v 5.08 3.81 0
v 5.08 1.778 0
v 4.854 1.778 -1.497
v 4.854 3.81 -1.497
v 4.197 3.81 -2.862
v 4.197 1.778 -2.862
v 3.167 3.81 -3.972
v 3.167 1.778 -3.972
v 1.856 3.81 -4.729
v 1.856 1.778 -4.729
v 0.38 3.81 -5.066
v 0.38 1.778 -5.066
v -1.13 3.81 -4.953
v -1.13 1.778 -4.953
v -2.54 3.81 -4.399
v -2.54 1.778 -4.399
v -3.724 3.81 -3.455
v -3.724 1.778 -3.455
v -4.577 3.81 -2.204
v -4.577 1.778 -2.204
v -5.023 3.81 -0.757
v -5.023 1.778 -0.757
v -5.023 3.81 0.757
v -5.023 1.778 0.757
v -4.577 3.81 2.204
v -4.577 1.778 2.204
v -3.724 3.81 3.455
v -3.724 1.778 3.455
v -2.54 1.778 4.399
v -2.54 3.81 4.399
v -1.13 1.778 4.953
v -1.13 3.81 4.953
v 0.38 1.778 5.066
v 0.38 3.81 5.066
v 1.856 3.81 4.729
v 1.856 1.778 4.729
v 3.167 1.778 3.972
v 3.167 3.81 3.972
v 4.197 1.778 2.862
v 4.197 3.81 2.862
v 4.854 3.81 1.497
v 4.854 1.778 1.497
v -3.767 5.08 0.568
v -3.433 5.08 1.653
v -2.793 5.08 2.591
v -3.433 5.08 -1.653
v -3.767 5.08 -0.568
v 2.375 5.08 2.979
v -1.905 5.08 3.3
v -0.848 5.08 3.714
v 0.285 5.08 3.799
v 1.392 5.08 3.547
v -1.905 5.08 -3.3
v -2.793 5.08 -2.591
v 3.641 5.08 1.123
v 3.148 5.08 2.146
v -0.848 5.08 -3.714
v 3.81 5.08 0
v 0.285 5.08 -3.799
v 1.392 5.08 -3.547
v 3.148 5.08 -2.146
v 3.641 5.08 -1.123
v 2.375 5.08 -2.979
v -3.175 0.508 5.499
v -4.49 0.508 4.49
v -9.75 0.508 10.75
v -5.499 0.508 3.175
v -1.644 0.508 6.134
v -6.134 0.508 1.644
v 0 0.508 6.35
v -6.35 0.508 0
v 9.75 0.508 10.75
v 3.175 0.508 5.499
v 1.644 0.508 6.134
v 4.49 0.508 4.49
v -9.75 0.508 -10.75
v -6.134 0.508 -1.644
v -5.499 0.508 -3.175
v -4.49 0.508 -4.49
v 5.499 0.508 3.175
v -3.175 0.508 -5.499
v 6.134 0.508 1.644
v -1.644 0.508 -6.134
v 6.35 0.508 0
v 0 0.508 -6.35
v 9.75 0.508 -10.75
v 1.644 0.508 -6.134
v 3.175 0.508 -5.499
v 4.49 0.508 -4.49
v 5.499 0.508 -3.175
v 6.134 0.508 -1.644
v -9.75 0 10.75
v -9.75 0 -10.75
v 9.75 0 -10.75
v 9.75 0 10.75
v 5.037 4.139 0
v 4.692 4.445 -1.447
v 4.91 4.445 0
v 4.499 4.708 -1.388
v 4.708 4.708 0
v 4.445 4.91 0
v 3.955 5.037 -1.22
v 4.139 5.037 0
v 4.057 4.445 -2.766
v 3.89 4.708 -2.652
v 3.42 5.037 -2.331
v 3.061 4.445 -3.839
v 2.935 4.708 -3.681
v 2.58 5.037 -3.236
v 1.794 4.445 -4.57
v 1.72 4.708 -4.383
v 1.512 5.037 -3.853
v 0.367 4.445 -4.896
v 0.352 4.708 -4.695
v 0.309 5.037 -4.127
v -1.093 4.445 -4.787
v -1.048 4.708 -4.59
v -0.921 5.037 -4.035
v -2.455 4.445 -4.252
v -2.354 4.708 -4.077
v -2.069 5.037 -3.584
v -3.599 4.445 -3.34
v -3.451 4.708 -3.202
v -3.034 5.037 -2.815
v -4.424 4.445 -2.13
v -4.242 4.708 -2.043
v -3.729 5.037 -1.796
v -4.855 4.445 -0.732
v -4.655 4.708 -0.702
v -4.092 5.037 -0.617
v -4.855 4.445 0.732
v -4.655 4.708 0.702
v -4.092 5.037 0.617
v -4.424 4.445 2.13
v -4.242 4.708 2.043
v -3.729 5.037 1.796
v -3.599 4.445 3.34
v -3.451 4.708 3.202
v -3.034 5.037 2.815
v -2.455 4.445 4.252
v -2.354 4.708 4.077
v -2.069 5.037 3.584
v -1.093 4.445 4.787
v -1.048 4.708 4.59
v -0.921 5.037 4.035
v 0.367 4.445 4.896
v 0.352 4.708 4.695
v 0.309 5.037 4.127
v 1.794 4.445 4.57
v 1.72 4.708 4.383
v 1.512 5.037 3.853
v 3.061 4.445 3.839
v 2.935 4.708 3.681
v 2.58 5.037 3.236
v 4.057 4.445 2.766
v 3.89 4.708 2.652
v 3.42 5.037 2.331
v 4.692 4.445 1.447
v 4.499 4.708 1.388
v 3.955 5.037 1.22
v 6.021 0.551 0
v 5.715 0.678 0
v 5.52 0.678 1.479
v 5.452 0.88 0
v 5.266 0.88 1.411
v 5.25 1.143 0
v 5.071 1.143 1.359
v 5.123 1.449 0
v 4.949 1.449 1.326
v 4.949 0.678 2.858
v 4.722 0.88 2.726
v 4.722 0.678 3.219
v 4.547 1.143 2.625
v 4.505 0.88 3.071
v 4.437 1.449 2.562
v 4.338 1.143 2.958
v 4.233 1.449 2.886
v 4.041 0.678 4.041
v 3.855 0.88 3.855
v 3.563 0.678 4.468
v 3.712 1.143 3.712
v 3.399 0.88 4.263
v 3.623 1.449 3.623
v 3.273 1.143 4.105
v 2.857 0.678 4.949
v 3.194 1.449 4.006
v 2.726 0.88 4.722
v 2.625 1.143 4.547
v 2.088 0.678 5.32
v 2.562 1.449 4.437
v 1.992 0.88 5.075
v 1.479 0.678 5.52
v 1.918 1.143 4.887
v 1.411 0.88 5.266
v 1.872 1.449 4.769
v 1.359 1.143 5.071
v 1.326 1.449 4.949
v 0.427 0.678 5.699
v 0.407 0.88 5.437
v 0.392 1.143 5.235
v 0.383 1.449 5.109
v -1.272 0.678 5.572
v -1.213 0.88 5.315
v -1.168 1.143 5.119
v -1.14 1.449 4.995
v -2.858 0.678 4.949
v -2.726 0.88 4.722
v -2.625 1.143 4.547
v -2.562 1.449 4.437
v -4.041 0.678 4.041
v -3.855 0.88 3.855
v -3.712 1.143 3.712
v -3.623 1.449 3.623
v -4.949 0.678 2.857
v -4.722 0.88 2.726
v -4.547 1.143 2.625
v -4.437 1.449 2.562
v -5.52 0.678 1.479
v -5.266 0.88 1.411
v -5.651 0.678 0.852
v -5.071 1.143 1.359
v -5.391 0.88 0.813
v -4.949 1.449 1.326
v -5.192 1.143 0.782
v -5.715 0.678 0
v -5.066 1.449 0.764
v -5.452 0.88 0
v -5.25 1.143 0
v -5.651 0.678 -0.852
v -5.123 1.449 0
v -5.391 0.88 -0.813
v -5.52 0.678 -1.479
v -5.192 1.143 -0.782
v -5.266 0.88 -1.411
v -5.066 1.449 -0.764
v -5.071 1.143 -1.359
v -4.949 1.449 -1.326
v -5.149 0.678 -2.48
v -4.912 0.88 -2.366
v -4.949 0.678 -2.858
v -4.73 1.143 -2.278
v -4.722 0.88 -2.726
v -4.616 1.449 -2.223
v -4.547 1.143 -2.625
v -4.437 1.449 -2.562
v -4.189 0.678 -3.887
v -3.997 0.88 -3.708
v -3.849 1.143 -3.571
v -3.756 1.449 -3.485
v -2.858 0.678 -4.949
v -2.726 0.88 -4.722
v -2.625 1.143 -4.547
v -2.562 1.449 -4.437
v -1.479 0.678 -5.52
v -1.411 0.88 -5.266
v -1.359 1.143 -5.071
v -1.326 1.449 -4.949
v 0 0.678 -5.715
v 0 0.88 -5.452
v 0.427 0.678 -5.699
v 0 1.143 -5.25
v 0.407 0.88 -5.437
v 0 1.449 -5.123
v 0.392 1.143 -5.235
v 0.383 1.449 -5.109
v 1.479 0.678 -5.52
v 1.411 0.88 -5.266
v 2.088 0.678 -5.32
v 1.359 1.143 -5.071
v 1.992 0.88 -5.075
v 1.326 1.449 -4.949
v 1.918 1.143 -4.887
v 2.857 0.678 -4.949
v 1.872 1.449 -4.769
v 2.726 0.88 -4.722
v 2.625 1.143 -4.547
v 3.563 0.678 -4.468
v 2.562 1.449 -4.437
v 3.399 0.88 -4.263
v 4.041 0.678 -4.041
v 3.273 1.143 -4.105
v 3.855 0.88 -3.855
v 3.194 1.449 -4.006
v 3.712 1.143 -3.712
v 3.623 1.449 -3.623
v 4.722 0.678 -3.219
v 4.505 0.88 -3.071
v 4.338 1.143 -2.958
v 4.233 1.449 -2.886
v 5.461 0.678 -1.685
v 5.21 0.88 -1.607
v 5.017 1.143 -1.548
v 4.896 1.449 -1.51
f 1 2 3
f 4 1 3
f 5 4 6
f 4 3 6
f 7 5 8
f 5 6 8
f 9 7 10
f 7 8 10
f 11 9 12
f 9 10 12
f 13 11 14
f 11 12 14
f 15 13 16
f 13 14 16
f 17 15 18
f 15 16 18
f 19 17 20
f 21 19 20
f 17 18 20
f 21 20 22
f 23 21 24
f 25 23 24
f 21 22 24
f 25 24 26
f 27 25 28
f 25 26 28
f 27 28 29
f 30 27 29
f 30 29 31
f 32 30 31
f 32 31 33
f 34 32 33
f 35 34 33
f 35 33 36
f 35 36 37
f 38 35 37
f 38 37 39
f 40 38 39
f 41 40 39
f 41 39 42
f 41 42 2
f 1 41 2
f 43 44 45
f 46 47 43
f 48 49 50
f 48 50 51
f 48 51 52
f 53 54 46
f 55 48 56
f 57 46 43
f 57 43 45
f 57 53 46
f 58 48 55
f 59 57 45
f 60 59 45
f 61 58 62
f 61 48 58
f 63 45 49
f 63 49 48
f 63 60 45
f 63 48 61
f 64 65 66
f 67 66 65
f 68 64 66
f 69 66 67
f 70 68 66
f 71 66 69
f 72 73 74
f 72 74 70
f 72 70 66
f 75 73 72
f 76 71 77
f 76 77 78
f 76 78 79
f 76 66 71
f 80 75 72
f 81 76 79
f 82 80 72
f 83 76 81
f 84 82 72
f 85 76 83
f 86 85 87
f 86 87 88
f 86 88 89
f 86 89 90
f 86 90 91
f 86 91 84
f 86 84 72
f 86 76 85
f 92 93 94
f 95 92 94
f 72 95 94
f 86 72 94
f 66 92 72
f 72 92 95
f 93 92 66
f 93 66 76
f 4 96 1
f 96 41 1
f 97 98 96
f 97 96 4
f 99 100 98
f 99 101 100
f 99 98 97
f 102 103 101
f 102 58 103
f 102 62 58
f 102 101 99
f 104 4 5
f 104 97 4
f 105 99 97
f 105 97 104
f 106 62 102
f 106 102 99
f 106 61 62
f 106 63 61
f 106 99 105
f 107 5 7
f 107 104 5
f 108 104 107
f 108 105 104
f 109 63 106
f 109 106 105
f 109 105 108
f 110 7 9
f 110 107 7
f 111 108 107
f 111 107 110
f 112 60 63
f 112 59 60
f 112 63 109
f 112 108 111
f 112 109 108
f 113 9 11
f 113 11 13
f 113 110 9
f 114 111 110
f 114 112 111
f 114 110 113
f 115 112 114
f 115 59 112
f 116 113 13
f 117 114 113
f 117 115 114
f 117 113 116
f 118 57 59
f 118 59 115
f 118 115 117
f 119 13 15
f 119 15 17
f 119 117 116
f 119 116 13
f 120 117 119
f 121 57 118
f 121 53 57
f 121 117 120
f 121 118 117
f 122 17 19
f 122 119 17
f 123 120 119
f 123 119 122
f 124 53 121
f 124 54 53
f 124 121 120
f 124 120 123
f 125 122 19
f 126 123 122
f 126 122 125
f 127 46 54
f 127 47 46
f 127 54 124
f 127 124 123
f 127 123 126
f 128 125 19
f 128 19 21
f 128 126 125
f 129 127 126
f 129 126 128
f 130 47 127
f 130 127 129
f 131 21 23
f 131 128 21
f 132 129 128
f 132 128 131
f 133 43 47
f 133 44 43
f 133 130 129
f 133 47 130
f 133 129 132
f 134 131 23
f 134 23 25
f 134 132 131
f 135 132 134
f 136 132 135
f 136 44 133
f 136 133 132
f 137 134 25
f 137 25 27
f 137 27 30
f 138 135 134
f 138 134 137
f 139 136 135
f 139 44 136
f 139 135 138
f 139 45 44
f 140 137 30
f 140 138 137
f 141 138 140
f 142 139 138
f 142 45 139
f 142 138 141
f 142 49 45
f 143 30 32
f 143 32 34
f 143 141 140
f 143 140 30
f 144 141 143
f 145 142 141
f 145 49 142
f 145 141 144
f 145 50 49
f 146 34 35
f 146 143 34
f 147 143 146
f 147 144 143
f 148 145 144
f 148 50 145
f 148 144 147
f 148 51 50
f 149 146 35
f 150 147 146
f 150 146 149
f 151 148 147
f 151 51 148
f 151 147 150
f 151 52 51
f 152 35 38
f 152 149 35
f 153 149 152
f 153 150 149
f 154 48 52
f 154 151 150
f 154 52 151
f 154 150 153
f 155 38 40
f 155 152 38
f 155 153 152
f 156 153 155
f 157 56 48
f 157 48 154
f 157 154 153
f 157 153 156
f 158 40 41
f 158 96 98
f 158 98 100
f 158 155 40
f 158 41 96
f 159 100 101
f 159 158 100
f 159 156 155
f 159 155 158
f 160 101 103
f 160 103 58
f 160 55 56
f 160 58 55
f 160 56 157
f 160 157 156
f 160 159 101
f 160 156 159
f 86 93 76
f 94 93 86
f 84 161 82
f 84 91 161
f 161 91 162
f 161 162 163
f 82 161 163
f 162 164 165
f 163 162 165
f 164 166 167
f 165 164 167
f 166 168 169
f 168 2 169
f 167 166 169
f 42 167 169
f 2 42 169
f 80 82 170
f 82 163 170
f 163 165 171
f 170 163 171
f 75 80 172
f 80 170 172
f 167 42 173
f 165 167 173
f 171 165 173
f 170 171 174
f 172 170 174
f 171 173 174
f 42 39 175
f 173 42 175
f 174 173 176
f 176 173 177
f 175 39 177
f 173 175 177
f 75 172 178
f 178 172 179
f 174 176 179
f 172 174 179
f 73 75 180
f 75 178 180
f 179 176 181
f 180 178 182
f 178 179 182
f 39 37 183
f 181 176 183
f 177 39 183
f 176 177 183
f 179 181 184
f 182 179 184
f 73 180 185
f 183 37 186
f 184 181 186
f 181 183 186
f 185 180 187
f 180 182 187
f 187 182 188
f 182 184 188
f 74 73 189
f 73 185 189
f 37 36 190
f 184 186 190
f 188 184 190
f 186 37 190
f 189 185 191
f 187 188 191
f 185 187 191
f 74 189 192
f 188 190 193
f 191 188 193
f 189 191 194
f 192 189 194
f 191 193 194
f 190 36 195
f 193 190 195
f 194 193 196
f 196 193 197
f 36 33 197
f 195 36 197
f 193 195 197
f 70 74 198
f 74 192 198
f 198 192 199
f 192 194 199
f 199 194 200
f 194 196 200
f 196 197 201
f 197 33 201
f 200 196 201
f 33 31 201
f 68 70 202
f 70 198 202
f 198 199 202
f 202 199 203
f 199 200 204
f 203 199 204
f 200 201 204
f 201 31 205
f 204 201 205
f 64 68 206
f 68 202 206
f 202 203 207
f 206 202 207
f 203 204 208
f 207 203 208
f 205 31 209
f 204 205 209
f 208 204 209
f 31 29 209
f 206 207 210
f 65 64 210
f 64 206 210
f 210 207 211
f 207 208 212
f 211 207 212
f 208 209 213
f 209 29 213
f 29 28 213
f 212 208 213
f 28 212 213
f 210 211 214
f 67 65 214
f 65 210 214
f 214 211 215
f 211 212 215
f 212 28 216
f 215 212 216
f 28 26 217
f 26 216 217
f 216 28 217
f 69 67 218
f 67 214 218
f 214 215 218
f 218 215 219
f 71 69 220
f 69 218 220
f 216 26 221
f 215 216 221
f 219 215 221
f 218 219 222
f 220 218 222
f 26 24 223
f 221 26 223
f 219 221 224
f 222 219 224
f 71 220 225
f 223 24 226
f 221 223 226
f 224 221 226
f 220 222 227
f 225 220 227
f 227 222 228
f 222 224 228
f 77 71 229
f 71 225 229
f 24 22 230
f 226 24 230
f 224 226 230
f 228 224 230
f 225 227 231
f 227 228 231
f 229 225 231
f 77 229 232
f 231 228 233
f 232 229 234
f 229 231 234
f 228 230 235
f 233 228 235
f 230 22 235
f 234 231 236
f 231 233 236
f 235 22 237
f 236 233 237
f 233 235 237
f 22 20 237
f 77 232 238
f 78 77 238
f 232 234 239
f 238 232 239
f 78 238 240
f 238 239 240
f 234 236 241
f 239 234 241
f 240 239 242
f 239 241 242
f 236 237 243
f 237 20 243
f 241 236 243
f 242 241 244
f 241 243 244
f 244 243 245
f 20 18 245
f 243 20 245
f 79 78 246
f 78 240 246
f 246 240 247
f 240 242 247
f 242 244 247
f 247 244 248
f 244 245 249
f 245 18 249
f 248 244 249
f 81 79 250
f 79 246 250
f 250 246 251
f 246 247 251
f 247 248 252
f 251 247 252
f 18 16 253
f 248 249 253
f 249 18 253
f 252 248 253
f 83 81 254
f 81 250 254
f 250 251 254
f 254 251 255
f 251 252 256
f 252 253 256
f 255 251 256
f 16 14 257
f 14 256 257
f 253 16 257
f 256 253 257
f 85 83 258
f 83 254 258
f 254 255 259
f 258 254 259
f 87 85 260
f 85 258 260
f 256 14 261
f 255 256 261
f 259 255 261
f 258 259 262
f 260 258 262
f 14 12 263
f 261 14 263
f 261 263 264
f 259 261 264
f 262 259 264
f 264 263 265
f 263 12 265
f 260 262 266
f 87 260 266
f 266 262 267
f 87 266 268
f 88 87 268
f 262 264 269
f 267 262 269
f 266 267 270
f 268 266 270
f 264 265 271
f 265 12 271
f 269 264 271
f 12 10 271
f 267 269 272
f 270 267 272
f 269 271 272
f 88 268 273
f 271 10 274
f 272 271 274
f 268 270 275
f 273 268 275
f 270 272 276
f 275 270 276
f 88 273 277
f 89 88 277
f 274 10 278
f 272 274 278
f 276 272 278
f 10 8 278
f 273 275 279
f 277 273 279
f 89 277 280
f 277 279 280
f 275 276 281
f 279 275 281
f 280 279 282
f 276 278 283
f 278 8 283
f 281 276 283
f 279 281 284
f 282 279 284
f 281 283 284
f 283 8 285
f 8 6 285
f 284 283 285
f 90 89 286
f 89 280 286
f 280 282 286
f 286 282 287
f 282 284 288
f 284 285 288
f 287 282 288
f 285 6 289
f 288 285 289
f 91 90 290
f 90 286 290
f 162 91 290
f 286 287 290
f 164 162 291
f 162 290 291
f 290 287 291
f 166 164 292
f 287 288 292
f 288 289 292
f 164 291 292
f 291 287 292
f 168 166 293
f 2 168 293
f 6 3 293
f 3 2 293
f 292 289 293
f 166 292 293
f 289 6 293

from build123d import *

# Parameters (mm, degrees)
SKETCH1_W           = 19.5
SKETCH1_H           = 21.5
BOSS_EXTRUDE1_DEPTH = 0.508
SKETCH2_R           = 5.08
BOSS_EXTRUDE2_DEPTH = 5.08
FILLET1_R           = 1.27


with BuildPart() as part:
    # Sketch1 → Boss-Extrude1 (new body)
    with BuildSketch(Plane(origin=(0, 0, 0), x_dir=(1, 0, 0), z_dir=(0, 1, 0))):
        Rectangle(SKETCH1_W, SKETCH1_H)
    extrude(amount=BOSS_EXTRUDE1_DEPTH)

    # Sketch2 → Boss-Extrude2 (add)
    with BuildSketch(Plane(origin=(0, 0, 0), x_dir=(1, 0, 0), z_dir=(0, 1, 0))):
        Circle(SKETCH2_R)
    extrude(amount=BOSS_EXTRUDE2_DEPTH)

    # Fillet1
    fillet1_edges = [part.edges().sort_by_distance(p)[0] for p in [
        (-5.08, 0.508, 0),
        (-5.08, 5.08, 0),
    ]]
    fillet(fillet1_edges, radius=FILLET1_R)


solid = part.part
